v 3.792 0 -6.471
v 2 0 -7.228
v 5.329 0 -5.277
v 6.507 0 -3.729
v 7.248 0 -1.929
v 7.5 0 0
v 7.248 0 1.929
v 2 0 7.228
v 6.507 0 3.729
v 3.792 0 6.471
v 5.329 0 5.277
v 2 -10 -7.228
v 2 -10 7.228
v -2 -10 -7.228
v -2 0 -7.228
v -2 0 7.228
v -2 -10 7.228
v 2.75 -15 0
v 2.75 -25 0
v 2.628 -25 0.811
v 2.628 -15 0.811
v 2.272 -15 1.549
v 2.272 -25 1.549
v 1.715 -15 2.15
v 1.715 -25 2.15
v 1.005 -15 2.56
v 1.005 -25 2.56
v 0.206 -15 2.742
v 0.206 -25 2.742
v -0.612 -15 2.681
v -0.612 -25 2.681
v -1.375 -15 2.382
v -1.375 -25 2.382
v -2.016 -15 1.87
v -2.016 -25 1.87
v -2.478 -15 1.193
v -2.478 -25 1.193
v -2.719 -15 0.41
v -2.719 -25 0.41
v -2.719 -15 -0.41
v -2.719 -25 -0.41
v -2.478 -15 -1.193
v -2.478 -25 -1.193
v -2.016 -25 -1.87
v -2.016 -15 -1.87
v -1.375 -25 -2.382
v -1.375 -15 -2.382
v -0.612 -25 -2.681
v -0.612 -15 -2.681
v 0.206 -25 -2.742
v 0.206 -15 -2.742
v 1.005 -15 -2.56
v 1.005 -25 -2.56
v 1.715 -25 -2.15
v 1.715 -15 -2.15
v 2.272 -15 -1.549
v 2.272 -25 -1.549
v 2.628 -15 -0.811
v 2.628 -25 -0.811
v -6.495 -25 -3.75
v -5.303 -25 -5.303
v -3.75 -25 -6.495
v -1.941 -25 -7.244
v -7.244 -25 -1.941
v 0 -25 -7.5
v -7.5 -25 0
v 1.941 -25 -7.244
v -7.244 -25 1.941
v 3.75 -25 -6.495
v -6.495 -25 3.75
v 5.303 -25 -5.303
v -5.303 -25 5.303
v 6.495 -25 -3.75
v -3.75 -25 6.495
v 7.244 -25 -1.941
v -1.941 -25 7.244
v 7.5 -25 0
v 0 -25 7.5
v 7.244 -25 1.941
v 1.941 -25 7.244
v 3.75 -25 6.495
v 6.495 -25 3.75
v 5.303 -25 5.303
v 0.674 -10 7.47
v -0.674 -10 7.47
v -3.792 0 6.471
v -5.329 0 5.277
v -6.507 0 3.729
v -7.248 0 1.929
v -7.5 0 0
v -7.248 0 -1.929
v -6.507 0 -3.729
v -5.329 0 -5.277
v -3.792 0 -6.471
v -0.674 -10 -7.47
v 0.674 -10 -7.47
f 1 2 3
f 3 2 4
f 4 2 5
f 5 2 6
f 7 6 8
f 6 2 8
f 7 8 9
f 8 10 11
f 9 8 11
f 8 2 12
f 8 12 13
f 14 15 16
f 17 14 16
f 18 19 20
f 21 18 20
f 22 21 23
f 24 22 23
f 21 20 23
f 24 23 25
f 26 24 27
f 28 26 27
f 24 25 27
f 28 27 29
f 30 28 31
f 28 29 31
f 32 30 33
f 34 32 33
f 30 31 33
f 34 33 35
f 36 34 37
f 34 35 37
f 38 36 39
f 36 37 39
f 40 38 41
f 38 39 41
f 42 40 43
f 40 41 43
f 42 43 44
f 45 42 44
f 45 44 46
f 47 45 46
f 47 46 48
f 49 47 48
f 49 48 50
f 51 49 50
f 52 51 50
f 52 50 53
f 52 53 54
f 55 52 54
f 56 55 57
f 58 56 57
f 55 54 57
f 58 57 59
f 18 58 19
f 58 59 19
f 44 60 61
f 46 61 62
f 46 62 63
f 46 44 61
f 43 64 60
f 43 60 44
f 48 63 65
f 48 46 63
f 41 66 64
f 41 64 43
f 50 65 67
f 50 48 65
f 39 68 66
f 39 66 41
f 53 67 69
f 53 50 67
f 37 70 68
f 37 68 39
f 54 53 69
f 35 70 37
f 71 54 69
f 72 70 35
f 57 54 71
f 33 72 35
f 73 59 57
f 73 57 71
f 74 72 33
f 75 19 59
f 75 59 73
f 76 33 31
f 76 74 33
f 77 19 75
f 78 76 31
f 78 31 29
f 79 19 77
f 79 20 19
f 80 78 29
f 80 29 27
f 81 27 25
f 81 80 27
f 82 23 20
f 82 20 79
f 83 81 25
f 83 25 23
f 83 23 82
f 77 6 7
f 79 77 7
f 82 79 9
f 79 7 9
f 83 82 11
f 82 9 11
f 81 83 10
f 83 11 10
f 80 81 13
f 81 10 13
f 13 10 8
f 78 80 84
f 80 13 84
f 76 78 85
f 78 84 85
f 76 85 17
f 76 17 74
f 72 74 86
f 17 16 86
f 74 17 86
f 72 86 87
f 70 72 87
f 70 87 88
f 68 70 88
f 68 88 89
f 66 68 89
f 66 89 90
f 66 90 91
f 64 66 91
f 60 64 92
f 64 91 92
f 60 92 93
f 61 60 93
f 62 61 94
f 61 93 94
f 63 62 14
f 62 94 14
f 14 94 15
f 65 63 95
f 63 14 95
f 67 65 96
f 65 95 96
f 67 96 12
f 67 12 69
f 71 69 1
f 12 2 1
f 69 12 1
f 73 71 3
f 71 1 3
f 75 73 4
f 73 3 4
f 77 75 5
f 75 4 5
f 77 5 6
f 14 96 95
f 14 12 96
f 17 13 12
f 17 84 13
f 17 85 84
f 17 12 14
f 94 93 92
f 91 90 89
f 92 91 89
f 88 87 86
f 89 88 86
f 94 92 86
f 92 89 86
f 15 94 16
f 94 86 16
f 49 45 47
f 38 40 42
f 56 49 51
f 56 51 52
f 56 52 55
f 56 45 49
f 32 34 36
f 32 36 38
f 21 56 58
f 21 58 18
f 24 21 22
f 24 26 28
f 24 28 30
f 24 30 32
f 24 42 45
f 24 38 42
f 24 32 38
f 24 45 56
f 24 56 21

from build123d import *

# Parameters (mm, degrees)
F0_R     = 7.5
F1_DEPTH = 25
F2_R     = 2.75
F3_DEPTH = 10
F4_W     = 4
F4_H     = 15
F5_DEPTH = 10


with BuildPart() as f1:
    # F0 (on Front) → F1 (new body)
    with BuildSketch(Plane.XZ):
        Circle(F0_R)
    extrude(amount=F1_DEPTH)

    # F2 (on face) → F3 (cut)
    with BuildSketch(Plane.XZ.offset(25)):
        Circle(F2_R)
    extrude(amount=-F3_DEPTH, mode=Mode.SUBTRACT)

    # F4 (on face) → F5 (cut)
    with BuildSketch(Plane(origin=(0, 0, 0), x_dir=(-1, 0, 0), z_dir=(0, 1, 0))):
        Rectangle(F4_W, F4_H)
    extrude(amount=-F5_DEPTH, mode=Mode.SUBTRACT)


solid = f1.part
